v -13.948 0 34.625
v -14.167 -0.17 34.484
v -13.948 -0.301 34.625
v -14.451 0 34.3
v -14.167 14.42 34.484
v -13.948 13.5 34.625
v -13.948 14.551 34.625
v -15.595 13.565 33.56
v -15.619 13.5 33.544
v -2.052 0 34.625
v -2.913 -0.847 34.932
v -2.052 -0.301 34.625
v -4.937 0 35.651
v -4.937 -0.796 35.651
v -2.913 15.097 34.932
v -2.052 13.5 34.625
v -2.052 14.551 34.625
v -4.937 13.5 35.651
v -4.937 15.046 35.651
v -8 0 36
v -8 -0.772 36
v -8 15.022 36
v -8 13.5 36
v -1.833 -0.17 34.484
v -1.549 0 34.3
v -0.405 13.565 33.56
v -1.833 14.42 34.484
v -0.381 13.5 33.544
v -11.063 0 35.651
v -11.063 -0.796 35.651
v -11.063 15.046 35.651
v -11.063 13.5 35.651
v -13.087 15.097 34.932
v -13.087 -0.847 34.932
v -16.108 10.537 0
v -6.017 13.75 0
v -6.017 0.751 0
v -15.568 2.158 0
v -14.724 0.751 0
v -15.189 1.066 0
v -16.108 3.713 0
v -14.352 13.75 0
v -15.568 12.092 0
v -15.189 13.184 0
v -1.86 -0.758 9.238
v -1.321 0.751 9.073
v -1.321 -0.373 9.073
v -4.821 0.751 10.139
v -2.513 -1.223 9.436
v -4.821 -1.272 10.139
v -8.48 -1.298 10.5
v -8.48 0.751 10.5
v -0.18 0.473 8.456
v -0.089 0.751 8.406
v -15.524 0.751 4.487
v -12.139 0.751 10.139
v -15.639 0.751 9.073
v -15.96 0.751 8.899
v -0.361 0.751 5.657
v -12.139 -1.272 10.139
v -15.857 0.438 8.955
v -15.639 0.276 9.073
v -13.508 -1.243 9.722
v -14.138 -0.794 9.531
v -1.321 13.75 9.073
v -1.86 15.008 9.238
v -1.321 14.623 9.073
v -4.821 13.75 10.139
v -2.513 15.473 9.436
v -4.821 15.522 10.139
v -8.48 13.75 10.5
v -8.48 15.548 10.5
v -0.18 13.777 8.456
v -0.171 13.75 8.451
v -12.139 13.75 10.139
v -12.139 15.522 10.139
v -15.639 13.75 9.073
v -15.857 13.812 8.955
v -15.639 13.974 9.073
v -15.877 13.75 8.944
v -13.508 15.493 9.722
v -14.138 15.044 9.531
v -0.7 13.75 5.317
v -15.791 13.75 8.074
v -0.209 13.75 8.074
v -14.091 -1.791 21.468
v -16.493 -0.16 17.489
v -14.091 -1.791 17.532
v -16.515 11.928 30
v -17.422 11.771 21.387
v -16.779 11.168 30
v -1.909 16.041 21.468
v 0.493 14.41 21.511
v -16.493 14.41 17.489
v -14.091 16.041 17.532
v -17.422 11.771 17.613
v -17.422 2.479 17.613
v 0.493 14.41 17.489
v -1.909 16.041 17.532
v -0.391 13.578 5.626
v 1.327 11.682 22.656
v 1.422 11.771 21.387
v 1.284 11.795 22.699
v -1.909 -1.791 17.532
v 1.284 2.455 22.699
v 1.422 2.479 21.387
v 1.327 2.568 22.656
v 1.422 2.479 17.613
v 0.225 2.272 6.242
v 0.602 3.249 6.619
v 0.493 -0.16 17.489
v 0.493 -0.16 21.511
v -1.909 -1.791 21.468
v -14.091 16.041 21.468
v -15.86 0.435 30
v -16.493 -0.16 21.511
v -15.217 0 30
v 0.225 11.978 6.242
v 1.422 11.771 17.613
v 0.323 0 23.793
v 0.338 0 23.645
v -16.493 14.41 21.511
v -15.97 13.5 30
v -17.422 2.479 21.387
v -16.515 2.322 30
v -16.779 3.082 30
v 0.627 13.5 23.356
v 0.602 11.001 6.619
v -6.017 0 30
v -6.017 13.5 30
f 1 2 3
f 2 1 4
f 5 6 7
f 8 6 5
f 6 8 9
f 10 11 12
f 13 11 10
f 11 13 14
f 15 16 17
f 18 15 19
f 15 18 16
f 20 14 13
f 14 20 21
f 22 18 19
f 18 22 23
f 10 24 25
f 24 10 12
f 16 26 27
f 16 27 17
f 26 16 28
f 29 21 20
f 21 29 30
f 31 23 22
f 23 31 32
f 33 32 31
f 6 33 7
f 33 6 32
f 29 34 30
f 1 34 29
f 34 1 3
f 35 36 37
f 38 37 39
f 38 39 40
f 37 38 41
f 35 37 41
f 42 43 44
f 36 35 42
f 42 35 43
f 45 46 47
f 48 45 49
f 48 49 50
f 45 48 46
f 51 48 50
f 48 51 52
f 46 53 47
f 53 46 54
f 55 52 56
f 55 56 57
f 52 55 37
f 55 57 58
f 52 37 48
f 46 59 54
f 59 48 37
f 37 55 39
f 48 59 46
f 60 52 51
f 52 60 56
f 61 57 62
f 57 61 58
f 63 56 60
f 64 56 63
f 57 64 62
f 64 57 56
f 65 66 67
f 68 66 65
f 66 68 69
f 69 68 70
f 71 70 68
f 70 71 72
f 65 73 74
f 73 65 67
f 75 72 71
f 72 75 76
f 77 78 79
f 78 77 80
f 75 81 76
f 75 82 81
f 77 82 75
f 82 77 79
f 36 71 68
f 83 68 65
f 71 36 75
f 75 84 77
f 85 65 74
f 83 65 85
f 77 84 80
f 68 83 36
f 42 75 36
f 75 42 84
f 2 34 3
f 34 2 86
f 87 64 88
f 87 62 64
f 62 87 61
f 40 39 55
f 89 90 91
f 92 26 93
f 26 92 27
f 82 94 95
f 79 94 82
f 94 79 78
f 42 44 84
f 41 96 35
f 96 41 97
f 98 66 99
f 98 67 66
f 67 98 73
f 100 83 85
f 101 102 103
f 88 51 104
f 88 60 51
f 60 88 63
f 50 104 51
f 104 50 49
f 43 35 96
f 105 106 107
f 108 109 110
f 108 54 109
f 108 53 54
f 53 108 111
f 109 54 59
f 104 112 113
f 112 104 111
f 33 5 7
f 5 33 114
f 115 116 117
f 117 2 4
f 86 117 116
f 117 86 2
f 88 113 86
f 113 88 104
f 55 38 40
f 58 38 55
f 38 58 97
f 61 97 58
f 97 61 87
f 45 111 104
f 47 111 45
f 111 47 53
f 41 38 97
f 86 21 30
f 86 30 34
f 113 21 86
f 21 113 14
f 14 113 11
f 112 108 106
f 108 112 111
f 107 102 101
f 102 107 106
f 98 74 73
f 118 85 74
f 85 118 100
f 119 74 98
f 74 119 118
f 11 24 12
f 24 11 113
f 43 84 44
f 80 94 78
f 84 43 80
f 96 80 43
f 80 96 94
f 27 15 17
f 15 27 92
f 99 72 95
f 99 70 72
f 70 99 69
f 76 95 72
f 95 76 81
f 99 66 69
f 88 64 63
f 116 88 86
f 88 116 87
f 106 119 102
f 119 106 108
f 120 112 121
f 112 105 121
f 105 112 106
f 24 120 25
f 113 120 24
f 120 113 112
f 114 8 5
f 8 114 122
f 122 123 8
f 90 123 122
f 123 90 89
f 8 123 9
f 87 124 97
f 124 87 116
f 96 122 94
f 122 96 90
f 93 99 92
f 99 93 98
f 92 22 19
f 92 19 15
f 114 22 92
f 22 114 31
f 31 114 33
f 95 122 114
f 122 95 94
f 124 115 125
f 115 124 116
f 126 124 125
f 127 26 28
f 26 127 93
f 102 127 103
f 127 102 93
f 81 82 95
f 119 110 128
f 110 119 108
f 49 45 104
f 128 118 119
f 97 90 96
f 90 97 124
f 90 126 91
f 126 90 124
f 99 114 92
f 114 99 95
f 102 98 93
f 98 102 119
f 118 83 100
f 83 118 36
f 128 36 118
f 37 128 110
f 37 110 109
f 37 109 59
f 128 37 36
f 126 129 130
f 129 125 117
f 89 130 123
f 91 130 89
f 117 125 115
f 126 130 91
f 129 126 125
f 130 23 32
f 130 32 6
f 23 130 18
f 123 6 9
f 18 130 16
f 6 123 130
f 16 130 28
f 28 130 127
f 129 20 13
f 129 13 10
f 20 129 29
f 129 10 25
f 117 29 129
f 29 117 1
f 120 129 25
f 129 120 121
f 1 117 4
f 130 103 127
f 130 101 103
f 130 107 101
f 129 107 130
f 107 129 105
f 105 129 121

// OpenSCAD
module fingerbase(length,x,y,z,padding,width)
{ 
	difference() {
		scale([y,x,z]) {
			intersection() {
                difference() {
                    union() {
                        translate([length-4,-5,5]) rotate([-90,0,0]) cylinder(r=8,h=width + 10);
                        translate([0,-5,-5]) cube([length,width + 10,20]);
                    }
                    //cutout for the side
                        translate([-4,-width+0.001,5.3]) rotate([-90,0,0]) cylinder(r=11,h=10);
                        translate([-4,width - padding*(1/x),5.3]) rotate([-90,0,0]) cylinder(r=11,h=10);
                }
                
                hull() {
                    for(i=[-1,1], j=[-1,1]) {
                        //angled cylinders to provide the outer shape of the finger
                        translate([length/10,i*2.4 + width/2,j*2.2 + 5]) rotate([i*j*-4,j*86,0]) cylinder(d=6,h=20,center=true);
                        translate([length+4, i*2.4 + width/2, j*2.2 + 5]) rotate([i*j*-4,j*-86,0]) cylinder(d=6,h=20,center=true);
                    }
                }
            } 
		}
        translate([0,padding/2 * x,0])              
        fingerbasecutout(width-padding,x,z);
        translate([length * y,0,0]) 
        mirror([1,0,0])fingerbasecutout(width-padding,x,z);
	}
}

module fingerbasecutout(width,x,z) {
	//cubic parts
	translate([-100,0,0]) cube([100,width*x,100]);
	translate([-13/z,0,0]) rotate([0,45,0]) translate([-50,0,0]) cube([100,width*x, 10]);
}

rotate([0,-90,0]) fingerbase(20,1.5,1.5,1.6,0.5,9.5);
